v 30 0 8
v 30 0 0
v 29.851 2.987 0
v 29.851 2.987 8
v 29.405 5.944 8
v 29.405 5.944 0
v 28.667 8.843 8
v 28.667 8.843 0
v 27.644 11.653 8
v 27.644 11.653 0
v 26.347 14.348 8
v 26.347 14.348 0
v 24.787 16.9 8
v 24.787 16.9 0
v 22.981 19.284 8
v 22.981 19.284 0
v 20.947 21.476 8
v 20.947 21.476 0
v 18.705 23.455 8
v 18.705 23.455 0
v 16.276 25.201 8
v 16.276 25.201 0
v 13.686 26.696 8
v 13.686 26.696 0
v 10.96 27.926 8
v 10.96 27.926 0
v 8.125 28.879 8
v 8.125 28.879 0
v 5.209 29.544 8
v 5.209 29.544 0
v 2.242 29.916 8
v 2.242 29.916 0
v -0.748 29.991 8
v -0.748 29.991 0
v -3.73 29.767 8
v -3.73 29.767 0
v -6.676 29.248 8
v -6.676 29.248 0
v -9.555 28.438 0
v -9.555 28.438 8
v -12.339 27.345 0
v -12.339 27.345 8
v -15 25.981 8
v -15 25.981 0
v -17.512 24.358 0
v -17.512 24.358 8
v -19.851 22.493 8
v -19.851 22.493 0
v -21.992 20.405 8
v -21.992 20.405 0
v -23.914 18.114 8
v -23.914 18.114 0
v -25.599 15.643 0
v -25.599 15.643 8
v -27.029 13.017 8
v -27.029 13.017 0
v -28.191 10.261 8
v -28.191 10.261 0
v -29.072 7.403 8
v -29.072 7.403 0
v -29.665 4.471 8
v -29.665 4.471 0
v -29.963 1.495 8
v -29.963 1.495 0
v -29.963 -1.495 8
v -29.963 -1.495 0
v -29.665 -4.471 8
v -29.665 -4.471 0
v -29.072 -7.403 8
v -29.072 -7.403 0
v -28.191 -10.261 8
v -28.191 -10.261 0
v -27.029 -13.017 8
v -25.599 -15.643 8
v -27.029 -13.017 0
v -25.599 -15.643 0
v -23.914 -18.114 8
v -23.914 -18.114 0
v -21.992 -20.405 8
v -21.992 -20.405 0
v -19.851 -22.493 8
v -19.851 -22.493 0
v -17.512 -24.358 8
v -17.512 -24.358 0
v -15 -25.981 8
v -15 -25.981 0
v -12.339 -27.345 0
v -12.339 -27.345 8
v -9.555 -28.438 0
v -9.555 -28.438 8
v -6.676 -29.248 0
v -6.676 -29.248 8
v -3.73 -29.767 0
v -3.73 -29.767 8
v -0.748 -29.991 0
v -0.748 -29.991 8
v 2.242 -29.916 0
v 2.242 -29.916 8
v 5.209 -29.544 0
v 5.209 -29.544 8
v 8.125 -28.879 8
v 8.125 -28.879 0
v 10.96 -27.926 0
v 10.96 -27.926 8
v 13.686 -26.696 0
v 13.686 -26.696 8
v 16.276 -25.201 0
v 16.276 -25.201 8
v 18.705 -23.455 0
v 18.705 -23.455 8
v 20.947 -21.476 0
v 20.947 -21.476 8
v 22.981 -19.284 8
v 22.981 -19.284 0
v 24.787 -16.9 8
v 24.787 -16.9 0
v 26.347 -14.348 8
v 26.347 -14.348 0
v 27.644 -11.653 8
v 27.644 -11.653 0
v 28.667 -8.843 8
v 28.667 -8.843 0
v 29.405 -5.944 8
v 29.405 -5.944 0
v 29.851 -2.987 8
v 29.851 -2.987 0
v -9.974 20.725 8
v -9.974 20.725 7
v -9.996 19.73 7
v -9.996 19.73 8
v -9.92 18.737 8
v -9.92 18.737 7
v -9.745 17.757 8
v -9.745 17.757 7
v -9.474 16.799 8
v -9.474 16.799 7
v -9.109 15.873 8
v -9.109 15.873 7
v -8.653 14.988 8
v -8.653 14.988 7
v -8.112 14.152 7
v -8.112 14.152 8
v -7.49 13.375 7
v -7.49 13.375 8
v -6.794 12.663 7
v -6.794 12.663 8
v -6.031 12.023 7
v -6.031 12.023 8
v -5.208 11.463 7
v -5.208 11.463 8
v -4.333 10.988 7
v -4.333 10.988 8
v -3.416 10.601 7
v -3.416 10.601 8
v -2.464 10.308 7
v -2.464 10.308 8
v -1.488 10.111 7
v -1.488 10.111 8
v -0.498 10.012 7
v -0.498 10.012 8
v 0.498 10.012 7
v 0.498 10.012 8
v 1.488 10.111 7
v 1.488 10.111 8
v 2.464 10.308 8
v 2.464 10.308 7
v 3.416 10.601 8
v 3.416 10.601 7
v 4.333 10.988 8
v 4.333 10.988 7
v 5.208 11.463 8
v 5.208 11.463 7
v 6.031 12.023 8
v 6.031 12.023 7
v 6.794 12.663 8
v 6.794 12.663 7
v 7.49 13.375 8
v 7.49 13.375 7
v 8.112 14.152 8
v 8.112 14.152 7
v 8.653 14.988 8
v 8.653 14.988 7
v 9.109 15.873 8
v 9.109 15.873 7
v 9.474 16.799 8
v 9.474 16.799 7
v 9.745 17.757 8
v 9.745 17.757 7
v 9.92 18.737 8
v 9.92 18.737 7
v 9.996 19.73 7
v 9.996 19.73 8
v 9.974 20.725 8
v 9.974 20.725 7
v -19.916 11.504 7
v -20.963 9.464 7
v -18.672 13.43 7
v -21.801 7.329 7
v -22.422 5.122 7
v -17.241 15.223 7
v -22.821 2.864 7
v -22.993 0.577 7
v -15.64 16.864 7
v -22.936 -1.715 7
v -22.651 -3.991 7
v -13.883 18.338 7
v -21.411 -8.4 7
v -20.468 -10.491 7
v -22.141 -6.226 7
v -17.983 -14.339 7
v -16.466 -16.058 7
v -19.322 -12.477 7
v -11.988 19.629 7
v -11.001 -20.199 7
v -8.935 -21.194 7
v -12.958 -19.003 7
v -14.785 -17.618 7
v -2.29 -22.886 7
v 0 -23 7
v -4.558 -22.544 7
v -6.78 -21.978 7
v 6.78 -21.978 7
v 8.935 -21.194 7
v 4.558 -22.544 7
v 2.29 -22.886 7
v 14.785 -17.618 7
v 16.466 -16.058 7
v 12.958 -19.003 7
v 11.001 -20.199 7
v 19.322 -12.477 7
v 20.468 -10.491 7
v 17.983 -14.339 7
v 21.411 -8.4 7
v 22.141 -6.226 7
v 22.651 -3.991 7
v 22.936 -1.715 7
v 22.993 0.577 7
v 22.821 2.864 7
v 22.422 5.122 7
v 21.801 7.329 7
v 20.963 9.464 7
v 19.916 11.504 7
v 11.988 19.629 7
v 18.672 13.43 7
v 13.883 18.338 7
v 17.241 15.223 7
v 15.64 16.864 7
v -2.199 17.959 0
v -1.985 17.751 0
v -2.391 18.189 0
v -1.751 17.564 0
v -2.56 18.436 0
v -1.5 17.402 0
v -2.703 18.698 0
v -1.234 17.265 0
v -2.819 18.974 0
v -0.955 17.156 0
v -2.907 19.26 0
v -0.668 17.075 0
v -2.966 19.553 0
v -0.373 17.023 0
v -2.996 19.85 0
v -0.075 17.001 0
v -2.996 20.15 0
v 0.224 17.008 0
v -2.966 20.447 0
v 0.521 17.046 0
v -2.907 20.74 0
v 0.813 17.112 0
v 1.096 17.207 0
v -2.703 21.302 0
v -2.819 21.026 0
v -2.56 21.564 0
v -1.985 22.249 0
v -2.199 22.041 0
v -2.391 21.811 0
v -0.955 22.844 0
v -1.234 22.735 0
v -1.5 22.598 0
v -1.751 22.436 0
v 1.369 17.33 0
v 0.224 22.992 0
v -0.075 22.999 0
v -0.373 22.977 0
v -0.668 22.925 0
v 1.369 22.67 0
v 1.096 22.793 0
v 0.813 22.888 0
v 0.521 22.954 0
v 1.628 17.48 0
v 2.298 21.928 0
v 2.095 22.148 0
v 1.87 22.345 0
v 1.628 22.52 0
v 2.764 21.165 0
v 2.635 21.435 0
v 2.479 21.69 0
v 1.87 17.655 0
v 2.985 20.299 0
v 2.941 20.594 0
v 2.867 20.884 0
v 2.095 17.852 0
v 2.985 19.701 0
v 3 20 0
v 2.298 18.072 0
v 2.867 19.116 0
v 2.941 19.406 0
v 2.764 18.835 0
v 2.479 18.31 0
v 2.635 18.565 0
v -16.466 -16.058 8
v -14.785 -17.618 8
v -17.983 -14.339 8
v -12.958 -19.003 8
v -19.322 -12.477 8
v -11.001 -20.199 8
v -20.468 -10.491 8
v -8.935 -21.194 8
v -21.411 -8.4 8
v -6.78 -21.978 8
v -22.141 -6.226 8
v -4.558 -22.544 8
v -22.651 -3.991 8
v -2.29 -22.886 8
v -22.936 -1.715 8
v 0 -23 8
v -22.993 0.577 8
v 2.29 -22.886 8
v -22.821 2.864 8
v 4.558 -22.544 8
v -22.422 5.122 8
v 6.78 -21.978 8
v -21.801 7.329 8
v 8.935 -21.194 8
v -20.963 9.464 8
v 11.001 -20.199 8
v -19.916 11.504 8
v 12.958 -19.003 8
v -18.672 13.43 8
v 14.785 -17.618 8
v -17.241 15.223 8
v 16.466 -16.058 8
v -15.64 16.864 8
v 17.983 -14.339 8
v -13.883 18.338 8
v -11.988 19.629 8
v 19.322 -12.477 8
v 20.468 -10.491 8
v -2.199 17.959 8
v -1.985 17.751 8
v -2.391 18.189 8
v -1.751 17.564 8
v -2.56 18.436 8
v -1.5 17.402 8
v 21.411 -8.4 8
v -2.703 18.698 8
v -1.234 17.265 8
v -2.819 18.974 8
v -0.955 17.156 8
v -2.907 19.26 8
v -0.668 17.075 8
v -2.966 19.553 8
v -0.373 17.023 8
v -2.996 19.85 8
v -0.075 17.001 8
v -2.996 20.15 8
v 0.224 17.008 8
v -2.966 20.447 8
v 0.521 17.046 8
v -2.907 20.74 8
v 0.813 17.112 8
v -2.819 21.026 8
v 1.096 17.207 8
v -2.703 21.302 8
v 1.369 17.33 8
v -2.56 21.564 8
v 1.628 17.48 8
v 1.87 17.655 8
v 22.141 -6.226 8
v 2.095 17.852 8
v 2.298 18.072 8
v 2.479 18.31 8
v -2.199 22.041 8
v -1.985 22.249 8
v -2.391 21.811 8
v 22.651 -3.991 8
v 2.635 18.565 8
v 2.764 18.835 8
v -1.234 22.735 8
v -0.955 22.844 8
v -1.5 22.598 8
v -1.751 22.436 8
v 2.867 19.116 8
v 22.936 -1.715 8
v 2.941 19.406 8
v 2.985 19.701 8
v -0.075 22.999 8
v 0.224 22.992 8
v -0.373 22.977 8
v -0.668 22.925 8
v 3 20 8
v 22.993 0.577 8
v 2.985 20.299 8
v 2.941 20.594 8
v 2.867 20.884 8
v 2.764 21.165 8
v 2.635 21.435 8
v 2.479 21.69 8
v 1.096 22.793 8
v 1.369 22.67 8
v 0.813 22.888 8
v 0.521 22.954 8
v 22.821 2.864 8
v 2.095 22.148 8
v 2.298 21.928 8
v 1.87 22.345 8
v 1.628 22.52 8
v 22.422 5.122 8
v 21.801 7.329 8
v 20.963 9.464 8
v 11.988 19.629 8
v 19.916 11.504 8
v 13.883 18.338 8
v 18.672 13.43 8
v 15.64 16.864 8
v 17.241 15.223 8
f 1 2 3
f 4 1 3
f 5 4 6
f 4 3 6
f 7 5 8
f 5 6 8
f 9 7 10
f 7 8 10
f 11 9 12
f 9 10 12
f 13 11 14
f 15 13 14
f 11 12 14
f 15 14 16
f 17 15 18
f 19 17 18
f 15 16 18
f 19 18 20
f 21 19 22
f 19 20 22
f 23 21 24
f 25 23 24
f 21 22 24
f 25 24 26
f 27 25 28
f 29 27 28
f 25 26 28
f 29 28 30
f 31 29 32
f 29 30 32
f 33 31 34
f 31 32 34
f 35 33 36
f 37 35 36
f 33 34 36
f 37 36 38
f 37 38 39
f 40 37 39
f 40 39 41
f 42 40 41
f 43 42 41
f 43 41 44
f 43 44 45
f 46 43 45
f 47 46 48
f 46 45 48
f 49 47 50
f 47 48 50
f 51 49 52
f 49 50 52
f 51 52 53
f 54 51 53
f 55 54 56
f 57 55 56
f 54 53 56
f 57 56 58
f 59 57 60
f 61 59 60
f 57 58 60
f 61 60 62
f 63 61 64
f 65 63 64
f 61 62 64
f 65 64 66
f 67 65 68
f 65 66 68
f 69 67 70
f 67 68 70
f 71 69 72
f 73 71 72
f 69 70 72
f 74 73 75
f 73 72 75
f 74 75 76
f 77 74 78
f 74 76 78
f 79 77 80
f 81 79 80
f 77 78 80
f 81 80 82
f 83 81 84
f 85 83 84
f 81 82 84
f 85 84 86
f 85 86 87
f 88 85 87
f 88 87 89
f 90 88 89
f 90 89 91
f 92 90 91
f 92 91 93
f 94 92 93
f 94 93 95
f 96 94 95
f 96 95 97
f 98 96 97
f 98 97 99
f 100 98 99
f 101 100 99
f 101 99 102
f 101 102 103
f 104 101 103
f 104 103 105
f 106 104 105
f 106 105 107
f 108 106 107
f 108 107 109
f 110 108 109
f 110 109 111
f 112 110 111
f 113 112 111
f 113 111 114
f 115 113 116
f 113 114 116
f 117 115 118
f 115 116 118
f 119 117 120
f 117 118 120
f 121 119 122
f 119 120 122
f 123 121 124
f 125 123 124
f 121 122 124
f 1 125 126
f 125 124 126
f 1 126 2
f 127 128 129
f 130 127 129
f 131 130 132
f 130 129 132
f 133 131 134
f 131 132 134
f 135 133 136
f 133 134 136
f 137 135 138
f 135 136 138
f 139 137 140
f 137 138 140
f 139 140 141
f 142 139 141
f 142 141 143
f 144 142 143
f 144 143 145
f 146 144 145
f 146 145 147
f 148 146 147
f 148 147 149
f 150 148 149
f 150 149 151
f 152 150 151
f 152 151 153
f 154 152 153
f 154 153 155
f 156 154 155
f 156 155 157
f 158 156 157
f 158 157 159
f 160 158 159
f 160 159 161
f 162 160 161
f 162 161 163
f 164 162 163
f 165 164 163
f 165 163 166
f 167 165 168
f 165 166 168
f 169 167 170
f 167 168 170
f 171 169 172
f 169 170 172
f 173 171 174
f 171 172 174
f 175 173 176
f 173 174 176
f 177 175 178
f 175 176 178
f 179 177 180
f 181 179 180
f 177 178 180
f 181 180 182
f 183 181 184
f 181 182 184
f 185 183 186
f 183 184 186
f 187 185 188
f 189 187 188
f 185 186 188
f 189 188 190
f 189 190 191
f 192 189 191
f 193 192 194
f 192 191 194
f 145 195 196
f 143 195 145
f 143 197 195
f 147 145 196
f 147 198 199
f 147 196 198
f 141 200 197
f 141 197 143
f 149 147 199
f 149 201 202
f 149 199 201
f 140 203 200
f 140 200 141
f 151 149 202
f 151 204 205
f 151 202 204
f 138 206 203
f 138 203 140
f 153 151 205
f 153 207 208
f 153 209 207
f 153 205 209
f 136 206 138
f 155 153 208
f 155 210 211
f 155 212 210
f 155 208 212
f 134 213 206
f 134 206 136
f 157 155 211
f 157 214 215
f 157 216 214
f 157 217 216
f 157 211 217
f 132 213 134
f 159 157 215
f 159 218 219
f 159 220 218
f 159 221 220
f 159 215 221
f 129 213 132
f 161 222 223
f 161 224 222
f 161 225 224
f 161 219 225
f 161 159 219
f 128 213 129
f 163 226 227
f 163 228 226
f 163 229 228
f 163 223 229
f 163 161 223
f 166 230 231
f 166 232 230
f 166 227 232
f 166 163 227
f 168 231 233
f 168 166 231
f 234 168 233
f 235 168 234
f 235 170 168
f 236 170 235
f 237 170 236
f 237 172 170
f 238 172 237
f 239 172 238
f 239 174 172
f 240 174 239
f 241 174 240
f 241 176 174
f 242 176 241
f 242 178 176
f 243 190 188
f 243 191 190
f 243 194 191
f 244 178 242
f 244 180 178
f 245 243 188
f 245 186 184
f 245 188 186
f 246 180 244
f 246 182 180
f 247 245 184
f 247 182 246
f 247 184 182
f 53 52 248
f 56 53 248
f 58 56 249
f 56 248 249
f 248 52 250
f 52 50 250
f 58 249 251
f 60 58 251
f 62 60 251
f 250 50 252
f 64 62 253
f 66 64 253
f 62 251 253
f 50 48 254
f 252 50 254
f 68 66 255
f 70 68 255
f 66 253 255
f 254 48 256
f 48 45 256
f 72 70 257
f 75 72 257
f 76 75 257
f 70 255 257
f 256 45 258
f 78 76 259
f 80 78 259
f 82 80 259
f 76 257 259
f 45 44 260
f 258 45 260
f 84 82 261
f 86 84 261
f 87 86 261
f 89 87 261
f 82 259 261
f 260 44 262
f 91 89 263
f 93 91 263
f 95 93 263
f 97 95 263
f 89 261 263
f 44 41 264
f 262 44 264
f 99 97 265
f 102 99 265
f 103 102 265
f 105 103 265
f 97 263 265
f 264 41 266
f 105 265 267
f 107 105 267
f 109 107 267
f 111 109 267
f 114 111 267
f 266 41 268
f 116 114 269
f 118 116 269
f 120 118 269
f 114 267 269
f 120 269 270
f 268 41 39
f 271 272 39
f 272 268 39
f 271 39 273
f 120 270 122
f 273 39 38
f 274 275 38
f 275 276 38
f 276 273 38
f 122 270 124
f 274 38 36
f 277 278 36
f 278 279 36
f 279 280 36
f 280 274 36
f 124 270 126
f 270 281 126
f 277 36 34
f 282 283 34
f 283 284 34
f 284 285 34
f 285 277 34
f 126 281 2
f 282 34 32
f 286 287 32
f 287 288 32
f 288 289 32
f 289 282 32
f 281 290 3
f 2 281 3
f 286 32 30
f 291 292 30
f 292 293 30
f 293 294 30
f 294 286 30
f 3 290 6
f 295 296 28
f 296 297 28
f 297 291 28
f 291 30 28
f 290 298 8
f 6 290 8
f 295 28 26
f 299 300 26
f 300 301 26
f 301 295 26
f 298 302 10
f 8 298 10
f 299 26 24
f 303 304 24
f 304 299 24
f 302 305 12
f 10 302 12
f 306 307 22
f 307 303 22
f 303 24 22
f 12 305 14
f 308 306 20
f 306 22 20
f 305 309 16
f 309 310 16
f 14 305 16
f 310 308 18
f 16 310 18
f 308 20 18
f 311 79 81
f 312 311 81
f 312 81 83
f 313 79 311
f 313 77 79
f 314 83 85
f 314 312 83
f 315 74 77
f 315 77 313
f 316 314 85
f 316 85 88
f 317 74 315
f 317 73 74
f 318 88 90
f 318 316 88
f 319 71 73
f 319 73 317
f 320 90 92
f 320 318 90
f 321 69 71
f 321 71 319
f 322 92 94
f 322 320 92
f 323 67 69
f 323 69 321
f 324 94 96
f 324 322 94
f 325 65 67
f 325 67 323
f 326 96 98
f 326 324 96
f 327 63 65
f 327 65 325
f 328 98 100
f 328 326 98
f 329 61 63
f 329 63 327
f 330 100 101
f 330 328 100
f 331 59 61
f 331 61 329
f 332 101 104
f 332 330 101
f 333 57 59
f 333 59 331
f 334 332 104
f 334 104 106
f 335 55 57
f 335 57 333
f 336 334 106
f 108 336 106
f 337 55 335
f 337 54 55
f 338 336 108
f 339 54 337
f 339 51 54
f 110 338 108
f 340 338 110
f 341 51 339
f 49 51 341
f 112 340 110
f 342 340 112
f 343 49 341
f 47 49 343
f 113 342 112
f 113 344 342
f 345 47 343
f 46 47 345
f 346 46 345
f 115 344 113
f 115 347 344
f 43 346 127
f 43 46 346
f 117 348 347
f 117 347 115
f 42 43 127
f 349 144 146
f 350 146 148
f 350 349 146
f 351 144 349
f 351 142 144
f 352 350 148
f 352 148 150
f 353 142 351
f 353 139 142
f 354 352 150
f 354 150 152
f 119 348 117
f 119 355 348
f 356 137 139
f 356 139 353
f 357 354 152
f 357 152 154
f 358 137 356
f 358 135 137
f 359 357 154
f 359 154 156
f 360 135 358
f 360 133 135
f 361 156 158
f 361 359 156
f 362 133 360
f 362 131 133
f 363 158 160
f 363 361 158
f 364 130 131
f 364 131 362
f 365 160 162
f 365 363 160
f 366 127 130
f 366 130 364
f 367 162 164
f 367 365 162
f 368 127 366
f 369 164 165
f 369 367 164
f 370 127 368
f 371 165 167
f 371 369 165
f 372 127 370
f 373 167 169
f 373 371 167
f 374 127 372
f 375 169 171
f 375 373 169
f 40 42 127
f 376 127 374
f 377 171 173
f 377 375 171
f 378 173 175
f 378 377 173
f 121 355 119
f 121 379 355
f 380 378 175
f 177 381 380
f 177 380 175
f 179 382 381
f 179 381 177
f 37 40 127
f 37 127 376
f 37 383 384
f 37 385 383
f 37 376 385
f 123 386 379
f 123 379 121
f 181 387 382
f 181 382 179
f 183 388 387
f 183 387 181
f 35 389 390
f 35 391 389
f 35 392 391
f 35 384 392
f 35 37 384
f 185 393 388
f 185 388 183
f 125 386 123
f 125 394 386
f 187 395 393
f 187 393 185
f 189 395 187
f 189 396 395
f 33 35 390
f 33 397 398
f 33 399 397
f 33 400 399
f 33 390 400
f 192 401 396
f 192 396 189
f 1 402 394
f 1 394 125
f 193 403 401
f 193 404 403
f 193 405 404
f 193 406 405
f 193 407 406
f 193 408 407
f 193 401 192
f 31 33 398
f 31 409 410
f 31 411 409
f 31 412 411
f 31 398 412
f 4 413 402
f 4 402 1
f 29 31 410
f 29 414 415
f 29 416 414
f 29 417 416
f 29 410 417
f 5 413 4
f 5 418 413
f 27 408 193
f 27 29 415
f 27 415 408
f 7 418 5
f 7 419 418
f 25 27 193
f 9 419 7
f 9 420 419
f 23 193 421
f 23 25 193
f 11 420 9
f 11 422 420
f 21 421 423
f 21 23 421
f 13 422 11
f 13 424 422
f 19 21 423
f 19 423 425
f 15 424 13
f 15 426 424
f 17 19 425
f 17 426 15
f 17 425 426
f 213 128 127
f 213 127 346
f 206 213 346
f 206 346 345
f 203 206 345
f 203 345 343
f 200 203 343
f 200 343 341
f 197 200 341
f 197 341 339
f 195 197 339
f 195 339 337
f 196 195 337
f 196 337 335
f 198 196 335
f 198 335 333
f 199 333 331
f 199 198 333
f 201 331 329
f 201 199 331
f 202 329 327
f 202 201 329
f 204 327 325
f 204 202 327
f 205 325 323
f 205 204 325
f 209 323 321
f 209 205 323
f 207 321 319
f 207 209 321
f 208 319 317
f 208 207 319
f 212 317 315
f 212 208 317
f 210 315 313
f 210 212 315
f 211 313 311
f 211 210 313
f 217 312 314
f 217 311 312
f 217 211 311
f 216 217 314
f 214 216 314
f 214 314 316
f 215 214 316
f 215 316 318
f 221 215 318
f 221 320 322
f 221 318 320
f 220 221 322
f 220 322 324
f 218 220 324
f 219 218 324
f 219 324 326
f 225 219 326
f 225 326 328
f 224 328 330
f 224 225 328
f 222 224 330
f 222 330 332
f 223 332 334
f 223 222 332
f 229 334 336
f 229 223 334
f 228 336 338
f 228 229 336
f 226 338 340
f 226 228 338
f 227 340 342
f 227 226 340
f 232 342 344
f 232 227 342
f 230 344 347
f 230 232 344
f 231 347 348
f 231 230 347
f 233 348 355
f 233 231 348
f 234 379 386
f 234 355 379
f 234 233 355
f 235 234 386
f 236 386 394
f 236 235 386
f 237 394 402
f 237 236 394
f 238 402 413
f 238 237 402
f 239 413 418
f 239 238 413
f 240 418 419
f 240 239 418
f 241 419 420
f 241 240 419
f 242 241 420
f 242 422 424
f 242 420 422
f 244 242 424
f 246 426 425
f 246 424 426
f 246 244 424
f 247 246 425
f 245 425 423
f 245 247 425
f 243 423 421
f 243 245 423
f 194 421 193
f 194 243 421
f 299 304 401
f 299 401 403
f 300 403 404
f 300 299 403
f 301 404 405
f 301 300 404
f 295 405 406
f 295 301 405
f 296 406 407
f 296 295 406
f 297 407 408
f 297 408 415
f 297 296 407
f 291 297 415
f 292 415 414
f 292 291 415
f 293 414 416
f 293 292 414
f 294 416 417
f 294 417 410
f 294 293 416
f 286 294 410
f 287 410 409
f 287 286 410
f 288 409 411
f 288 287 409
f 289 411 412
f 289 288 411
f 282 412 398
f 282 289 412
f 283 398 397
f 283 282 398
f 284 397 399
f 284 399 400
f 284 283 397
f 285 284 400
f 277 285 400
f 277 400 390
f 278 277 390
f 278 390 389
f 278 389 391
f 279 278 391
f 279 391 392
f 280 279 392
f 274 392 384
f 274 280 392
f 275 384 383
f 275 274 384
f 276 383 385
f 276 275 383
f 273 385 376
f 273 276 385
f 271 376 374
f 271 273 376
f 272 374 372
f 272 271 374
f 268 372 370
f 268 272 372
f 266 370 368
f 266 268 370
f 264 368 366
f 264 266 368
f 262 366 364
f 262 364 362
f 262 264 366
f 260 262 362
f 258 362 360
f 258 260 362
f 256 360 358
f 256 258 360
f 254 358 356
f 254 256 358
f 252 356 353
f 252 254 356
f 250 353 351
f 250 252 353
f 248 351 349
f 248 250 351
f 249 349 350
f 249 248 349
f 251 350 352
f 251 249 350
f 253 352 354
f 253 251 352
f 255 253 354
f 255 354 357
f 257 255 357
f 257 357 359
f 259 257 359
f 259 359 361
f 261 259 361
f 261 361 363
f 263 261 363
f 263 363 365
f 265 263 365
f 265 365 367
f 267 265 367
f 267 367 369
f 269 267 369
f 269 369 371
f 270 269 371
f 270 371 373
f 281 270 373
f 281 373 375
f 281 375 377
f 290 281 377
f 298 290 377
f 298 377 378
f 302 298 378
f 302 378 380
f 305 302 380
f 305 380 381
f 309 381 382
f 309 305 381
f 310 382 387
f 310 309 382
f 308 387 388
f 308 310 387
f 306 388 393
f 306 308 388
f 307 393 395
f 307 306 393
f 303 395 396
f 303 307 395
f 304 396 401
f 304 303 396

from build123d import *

# Parameters (mm, degrees)
F0_R     = 30
F0_R_2   = 3
F1_DEPTH = 8
F2_T     = -7


with BuildPart() as f1:
    # F0 (on Top) → F1 (new body)
    with BuildSketch(Plane.XY):
        Circle(F0_R)
        with Locations((0, 20)):
            Circle(F0_R_2, mode=Mode.SUBTRACT)
    extrude(amount=F1_DEPTH)

    # F2
    f2_openings = [f1.faces().sort_by_distance(p)[0] for p in [
        (0, -0.20202, 8),
    ]]
    offset(amount=F2_T, openings=f2_openings)


solid = f1.part
